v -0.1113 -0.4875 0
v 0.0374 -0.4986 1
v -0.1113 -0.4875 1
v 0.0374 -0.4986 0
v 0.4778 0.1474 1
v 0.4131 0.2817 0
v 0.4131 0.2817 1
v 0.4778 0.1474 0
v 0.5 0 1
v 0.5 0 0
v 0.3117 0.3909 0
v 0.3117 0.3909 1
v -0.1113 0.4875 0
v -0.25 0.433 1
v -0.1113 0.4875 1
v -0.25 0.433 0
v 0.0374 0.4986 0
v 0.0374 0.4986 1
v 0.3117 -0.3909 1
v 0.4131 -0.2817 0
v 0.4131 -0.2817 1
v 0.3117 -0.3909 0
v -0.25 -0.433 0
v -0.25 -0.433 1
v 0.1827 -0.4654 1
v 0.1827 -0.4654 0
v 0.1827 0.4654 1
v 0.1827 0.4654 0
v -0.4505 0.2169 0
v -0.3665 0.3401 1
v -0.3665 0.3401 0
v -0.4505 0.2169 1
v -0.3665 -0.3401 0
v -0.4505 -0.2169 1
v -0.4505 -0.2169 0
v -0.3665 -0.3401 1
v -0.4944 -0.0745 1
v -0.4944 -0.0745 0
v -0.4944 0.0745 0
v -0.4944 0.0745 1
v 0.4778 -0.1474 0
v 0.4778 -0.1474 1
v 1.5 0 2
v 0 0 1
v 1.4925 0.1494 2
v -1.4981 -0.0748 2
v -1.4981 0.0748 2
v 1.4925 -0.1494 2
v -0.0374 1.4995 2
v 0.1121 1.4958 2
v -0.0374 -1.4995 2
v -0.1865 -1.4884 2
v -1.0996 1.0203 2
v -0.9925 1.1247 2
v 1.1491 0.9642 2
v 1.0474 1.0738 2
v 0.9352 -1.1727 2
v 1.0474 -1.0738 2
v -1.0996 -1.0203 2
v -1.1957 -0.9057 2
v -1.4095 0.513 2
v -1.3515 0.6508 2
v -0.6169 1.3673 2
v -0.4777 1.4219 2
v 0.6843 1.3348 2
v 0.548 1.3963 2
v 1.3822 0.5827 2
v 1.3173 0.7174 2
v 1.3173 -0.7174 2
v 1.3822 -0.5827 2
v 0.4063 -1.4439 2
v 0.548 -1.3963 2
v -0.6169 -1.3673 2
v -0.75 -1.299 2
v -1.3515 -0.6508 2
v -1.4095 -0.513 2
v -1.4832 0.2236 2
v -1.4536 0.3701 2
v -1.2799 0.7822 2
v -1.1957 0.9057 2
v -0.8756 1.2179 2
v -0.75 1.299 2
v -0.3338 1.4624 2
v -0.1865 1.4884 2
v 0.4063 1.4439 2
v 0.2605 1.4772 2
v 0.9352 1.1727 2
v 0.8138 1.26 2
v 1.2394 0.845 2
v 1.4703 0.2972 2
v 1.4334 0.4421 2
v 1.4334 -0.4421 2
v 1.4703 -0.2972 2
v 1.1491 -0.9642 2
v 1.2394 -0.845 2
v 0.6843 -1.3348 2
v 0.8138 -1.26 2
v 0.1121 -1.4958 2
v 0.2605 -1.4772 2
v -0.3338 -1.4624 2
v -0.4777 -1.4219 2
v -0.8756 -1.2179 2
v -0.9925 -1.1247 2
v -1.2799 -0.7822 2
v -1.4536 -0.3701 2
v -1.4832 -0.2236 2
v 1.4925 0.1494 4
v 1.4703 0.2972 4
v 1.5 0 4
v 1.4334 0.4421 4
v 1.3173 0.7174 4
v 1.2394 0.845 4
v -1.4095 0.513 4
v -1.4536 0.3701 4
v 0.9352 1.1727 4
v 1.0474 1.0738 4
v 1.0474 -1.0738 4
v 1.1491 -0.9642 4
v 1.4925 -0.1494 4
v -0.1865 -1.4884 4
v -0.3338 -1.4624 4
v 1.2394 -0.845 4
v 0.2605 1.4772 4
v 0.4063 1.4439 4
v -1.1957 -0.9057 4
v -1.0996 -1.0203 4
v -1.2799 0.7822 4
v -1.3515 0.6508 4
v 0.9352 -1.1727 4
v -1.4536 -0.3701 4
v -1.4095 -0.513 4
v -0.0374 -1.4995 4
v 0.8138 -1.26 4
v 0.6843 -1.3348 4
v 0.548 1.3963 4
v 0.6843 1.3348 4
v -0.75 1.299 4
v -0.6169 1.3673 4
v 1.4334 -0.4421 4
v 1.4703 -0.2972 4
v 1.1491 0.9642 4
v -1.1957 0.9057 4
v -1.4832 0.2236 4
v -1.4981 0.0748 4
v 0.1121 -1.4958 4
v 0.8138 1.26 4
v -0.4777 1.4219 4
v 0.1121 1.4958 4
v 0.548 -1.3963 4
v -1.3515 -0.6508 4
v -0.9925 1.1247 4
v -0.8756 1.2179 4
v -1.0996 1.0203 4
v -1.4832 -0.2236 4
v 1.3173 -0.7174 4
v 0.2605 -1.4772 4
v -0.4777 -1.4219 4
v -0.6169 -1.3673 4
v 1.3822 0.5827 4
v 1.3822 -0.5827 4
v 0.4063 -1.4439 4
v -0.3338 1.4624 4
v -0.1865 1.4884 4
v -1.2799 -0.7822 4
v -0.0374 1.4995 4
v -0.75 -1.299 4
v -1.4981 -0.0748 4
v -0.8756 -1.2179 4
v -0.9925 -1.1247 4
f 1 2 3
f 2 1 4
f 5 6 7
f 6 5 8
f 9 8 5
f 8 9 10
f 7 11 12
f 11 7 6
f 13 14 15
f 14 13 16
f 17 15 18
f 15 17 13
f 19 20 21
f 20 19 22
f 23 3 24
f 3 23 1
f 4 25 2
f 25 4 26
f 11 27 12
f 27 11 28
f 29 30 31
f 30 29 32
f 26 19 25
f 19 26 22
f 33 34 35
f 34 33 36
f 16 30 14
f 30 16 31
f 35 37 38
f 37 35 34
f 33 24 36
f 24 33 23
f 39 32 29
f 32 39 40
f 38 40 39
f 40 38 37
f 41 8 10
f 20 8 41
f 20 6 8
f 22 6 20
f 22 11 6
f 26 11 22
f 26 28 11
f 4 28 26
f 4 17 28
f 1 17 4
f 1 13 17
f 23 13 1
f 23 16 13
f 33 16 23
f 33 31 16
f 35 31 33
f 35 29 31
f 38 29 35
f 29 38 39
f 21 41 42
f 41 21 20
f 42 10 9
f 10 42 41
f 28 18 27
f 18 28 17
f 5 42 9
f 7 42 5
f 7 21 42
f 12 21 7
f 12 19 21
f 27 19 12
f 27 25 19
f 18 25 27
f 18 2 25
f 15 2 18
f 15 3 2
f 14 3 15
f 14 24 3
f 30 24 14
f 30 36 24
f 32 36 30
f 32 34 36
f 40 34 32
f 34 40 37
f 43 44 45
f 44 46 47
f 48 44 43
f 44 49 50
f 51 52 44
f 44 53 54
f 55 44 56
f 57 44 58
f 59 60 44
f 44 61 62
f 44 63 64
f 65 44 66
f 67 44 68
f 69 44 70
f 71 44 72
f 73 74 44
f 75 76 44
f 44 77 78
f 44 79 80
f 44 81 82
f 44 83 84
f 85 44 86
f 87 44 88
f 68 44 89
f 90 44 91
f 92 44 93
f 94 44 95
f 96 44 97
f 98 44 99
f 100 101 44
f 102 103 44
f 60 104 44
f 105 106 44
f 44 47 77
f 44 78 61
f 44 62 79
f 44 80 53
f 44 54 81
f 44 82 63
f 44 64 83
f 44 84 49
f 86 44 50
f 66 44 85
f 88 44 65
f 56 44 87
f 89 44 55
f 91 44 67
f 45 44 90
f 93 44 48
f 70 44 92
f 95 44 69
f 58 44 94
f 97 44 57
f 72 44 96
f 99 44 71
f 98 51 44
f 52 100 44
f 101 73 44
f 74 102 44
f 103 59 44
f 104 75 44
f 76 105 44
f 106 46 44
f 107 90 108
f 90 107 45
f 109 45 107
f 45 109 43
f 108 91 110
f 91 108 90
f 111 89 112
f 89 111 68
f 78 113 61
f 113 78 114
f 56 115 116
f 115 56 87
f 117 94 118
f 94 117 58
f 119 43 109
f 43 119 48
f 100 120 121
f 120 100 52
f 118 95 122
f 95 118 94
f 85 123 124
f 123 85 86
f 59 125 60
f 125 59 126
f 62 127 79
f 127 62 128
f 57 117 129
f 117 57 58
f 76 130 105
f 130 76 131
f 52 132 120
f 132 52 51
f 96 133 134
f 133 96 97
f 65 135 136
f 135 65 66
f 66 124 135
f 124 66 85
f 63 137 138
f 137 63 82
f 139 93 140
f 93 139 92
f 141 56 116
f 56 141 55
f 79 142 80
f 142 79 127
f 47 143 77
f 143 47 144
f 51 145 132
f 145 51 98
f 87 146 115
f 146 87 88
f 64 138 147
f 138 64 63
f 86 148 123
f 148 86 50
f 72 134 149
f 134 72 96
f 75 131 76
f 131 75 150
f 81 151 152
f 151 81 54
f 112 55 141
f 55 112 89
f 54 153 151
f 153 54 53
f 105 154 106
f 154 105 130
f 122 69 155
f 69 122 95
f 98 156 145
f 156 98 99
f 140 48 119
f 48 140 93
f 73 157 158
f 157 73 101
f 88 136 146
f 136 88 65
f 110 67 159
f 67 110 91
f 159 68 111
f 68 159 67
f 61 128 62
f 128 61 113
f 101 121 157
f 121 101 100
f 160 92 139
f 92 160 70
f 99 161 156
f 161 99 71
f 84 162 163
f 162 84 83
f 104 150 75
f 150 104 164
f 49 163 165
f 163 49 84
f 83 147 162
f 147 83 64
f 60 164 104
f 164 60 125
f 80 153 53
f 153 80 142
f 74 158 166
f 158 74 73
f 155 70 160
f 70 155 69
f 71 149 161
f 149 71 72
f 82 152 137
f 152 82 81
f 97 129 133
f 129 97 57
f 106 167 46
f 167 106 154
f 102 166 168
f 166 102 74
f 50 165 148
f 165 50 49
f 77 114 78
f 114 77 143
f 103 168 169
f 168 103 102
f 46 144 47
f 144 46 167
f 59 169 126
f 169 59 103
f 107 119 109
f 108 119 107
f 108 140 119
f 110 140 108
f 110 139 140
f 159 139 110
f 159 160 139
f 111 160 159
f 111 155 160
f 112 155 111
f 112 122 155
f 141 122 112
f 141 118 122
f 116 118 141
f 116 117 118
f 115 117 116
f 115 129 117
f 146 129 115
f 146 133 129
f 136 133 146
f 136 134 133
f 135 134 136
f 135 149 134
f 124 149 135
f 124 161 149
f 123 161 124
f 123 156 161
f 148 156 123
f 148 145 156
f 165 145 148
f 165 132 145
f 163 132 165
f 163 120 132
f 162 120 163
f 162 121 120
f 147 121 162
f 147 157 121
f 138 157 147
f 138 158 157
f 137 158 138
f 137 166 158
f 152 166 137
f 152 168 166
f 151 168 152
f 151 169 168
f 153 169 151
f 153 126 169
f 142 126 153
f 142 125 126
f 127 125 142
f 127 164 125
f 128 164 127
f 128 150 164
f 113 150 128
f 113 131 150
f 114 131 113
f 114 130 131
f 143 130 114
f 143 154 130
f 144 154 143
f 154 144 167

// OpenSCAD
let($fa=2.000000, $fn=0, $fs=0.150000) union() { translate(v=[0.000000, 0.000000, 0.000000]) cylinder(d=1.000000, h=1.000000); translate(v=[0.000000, 0.000000, 1.000000]) cylinder(d1=0.000000, d2=3.000000, h=1.000000); translate(v=[0.000000, 0.000000, 2.000000]) cylinder(d=3.000000, h=2.000000); }
